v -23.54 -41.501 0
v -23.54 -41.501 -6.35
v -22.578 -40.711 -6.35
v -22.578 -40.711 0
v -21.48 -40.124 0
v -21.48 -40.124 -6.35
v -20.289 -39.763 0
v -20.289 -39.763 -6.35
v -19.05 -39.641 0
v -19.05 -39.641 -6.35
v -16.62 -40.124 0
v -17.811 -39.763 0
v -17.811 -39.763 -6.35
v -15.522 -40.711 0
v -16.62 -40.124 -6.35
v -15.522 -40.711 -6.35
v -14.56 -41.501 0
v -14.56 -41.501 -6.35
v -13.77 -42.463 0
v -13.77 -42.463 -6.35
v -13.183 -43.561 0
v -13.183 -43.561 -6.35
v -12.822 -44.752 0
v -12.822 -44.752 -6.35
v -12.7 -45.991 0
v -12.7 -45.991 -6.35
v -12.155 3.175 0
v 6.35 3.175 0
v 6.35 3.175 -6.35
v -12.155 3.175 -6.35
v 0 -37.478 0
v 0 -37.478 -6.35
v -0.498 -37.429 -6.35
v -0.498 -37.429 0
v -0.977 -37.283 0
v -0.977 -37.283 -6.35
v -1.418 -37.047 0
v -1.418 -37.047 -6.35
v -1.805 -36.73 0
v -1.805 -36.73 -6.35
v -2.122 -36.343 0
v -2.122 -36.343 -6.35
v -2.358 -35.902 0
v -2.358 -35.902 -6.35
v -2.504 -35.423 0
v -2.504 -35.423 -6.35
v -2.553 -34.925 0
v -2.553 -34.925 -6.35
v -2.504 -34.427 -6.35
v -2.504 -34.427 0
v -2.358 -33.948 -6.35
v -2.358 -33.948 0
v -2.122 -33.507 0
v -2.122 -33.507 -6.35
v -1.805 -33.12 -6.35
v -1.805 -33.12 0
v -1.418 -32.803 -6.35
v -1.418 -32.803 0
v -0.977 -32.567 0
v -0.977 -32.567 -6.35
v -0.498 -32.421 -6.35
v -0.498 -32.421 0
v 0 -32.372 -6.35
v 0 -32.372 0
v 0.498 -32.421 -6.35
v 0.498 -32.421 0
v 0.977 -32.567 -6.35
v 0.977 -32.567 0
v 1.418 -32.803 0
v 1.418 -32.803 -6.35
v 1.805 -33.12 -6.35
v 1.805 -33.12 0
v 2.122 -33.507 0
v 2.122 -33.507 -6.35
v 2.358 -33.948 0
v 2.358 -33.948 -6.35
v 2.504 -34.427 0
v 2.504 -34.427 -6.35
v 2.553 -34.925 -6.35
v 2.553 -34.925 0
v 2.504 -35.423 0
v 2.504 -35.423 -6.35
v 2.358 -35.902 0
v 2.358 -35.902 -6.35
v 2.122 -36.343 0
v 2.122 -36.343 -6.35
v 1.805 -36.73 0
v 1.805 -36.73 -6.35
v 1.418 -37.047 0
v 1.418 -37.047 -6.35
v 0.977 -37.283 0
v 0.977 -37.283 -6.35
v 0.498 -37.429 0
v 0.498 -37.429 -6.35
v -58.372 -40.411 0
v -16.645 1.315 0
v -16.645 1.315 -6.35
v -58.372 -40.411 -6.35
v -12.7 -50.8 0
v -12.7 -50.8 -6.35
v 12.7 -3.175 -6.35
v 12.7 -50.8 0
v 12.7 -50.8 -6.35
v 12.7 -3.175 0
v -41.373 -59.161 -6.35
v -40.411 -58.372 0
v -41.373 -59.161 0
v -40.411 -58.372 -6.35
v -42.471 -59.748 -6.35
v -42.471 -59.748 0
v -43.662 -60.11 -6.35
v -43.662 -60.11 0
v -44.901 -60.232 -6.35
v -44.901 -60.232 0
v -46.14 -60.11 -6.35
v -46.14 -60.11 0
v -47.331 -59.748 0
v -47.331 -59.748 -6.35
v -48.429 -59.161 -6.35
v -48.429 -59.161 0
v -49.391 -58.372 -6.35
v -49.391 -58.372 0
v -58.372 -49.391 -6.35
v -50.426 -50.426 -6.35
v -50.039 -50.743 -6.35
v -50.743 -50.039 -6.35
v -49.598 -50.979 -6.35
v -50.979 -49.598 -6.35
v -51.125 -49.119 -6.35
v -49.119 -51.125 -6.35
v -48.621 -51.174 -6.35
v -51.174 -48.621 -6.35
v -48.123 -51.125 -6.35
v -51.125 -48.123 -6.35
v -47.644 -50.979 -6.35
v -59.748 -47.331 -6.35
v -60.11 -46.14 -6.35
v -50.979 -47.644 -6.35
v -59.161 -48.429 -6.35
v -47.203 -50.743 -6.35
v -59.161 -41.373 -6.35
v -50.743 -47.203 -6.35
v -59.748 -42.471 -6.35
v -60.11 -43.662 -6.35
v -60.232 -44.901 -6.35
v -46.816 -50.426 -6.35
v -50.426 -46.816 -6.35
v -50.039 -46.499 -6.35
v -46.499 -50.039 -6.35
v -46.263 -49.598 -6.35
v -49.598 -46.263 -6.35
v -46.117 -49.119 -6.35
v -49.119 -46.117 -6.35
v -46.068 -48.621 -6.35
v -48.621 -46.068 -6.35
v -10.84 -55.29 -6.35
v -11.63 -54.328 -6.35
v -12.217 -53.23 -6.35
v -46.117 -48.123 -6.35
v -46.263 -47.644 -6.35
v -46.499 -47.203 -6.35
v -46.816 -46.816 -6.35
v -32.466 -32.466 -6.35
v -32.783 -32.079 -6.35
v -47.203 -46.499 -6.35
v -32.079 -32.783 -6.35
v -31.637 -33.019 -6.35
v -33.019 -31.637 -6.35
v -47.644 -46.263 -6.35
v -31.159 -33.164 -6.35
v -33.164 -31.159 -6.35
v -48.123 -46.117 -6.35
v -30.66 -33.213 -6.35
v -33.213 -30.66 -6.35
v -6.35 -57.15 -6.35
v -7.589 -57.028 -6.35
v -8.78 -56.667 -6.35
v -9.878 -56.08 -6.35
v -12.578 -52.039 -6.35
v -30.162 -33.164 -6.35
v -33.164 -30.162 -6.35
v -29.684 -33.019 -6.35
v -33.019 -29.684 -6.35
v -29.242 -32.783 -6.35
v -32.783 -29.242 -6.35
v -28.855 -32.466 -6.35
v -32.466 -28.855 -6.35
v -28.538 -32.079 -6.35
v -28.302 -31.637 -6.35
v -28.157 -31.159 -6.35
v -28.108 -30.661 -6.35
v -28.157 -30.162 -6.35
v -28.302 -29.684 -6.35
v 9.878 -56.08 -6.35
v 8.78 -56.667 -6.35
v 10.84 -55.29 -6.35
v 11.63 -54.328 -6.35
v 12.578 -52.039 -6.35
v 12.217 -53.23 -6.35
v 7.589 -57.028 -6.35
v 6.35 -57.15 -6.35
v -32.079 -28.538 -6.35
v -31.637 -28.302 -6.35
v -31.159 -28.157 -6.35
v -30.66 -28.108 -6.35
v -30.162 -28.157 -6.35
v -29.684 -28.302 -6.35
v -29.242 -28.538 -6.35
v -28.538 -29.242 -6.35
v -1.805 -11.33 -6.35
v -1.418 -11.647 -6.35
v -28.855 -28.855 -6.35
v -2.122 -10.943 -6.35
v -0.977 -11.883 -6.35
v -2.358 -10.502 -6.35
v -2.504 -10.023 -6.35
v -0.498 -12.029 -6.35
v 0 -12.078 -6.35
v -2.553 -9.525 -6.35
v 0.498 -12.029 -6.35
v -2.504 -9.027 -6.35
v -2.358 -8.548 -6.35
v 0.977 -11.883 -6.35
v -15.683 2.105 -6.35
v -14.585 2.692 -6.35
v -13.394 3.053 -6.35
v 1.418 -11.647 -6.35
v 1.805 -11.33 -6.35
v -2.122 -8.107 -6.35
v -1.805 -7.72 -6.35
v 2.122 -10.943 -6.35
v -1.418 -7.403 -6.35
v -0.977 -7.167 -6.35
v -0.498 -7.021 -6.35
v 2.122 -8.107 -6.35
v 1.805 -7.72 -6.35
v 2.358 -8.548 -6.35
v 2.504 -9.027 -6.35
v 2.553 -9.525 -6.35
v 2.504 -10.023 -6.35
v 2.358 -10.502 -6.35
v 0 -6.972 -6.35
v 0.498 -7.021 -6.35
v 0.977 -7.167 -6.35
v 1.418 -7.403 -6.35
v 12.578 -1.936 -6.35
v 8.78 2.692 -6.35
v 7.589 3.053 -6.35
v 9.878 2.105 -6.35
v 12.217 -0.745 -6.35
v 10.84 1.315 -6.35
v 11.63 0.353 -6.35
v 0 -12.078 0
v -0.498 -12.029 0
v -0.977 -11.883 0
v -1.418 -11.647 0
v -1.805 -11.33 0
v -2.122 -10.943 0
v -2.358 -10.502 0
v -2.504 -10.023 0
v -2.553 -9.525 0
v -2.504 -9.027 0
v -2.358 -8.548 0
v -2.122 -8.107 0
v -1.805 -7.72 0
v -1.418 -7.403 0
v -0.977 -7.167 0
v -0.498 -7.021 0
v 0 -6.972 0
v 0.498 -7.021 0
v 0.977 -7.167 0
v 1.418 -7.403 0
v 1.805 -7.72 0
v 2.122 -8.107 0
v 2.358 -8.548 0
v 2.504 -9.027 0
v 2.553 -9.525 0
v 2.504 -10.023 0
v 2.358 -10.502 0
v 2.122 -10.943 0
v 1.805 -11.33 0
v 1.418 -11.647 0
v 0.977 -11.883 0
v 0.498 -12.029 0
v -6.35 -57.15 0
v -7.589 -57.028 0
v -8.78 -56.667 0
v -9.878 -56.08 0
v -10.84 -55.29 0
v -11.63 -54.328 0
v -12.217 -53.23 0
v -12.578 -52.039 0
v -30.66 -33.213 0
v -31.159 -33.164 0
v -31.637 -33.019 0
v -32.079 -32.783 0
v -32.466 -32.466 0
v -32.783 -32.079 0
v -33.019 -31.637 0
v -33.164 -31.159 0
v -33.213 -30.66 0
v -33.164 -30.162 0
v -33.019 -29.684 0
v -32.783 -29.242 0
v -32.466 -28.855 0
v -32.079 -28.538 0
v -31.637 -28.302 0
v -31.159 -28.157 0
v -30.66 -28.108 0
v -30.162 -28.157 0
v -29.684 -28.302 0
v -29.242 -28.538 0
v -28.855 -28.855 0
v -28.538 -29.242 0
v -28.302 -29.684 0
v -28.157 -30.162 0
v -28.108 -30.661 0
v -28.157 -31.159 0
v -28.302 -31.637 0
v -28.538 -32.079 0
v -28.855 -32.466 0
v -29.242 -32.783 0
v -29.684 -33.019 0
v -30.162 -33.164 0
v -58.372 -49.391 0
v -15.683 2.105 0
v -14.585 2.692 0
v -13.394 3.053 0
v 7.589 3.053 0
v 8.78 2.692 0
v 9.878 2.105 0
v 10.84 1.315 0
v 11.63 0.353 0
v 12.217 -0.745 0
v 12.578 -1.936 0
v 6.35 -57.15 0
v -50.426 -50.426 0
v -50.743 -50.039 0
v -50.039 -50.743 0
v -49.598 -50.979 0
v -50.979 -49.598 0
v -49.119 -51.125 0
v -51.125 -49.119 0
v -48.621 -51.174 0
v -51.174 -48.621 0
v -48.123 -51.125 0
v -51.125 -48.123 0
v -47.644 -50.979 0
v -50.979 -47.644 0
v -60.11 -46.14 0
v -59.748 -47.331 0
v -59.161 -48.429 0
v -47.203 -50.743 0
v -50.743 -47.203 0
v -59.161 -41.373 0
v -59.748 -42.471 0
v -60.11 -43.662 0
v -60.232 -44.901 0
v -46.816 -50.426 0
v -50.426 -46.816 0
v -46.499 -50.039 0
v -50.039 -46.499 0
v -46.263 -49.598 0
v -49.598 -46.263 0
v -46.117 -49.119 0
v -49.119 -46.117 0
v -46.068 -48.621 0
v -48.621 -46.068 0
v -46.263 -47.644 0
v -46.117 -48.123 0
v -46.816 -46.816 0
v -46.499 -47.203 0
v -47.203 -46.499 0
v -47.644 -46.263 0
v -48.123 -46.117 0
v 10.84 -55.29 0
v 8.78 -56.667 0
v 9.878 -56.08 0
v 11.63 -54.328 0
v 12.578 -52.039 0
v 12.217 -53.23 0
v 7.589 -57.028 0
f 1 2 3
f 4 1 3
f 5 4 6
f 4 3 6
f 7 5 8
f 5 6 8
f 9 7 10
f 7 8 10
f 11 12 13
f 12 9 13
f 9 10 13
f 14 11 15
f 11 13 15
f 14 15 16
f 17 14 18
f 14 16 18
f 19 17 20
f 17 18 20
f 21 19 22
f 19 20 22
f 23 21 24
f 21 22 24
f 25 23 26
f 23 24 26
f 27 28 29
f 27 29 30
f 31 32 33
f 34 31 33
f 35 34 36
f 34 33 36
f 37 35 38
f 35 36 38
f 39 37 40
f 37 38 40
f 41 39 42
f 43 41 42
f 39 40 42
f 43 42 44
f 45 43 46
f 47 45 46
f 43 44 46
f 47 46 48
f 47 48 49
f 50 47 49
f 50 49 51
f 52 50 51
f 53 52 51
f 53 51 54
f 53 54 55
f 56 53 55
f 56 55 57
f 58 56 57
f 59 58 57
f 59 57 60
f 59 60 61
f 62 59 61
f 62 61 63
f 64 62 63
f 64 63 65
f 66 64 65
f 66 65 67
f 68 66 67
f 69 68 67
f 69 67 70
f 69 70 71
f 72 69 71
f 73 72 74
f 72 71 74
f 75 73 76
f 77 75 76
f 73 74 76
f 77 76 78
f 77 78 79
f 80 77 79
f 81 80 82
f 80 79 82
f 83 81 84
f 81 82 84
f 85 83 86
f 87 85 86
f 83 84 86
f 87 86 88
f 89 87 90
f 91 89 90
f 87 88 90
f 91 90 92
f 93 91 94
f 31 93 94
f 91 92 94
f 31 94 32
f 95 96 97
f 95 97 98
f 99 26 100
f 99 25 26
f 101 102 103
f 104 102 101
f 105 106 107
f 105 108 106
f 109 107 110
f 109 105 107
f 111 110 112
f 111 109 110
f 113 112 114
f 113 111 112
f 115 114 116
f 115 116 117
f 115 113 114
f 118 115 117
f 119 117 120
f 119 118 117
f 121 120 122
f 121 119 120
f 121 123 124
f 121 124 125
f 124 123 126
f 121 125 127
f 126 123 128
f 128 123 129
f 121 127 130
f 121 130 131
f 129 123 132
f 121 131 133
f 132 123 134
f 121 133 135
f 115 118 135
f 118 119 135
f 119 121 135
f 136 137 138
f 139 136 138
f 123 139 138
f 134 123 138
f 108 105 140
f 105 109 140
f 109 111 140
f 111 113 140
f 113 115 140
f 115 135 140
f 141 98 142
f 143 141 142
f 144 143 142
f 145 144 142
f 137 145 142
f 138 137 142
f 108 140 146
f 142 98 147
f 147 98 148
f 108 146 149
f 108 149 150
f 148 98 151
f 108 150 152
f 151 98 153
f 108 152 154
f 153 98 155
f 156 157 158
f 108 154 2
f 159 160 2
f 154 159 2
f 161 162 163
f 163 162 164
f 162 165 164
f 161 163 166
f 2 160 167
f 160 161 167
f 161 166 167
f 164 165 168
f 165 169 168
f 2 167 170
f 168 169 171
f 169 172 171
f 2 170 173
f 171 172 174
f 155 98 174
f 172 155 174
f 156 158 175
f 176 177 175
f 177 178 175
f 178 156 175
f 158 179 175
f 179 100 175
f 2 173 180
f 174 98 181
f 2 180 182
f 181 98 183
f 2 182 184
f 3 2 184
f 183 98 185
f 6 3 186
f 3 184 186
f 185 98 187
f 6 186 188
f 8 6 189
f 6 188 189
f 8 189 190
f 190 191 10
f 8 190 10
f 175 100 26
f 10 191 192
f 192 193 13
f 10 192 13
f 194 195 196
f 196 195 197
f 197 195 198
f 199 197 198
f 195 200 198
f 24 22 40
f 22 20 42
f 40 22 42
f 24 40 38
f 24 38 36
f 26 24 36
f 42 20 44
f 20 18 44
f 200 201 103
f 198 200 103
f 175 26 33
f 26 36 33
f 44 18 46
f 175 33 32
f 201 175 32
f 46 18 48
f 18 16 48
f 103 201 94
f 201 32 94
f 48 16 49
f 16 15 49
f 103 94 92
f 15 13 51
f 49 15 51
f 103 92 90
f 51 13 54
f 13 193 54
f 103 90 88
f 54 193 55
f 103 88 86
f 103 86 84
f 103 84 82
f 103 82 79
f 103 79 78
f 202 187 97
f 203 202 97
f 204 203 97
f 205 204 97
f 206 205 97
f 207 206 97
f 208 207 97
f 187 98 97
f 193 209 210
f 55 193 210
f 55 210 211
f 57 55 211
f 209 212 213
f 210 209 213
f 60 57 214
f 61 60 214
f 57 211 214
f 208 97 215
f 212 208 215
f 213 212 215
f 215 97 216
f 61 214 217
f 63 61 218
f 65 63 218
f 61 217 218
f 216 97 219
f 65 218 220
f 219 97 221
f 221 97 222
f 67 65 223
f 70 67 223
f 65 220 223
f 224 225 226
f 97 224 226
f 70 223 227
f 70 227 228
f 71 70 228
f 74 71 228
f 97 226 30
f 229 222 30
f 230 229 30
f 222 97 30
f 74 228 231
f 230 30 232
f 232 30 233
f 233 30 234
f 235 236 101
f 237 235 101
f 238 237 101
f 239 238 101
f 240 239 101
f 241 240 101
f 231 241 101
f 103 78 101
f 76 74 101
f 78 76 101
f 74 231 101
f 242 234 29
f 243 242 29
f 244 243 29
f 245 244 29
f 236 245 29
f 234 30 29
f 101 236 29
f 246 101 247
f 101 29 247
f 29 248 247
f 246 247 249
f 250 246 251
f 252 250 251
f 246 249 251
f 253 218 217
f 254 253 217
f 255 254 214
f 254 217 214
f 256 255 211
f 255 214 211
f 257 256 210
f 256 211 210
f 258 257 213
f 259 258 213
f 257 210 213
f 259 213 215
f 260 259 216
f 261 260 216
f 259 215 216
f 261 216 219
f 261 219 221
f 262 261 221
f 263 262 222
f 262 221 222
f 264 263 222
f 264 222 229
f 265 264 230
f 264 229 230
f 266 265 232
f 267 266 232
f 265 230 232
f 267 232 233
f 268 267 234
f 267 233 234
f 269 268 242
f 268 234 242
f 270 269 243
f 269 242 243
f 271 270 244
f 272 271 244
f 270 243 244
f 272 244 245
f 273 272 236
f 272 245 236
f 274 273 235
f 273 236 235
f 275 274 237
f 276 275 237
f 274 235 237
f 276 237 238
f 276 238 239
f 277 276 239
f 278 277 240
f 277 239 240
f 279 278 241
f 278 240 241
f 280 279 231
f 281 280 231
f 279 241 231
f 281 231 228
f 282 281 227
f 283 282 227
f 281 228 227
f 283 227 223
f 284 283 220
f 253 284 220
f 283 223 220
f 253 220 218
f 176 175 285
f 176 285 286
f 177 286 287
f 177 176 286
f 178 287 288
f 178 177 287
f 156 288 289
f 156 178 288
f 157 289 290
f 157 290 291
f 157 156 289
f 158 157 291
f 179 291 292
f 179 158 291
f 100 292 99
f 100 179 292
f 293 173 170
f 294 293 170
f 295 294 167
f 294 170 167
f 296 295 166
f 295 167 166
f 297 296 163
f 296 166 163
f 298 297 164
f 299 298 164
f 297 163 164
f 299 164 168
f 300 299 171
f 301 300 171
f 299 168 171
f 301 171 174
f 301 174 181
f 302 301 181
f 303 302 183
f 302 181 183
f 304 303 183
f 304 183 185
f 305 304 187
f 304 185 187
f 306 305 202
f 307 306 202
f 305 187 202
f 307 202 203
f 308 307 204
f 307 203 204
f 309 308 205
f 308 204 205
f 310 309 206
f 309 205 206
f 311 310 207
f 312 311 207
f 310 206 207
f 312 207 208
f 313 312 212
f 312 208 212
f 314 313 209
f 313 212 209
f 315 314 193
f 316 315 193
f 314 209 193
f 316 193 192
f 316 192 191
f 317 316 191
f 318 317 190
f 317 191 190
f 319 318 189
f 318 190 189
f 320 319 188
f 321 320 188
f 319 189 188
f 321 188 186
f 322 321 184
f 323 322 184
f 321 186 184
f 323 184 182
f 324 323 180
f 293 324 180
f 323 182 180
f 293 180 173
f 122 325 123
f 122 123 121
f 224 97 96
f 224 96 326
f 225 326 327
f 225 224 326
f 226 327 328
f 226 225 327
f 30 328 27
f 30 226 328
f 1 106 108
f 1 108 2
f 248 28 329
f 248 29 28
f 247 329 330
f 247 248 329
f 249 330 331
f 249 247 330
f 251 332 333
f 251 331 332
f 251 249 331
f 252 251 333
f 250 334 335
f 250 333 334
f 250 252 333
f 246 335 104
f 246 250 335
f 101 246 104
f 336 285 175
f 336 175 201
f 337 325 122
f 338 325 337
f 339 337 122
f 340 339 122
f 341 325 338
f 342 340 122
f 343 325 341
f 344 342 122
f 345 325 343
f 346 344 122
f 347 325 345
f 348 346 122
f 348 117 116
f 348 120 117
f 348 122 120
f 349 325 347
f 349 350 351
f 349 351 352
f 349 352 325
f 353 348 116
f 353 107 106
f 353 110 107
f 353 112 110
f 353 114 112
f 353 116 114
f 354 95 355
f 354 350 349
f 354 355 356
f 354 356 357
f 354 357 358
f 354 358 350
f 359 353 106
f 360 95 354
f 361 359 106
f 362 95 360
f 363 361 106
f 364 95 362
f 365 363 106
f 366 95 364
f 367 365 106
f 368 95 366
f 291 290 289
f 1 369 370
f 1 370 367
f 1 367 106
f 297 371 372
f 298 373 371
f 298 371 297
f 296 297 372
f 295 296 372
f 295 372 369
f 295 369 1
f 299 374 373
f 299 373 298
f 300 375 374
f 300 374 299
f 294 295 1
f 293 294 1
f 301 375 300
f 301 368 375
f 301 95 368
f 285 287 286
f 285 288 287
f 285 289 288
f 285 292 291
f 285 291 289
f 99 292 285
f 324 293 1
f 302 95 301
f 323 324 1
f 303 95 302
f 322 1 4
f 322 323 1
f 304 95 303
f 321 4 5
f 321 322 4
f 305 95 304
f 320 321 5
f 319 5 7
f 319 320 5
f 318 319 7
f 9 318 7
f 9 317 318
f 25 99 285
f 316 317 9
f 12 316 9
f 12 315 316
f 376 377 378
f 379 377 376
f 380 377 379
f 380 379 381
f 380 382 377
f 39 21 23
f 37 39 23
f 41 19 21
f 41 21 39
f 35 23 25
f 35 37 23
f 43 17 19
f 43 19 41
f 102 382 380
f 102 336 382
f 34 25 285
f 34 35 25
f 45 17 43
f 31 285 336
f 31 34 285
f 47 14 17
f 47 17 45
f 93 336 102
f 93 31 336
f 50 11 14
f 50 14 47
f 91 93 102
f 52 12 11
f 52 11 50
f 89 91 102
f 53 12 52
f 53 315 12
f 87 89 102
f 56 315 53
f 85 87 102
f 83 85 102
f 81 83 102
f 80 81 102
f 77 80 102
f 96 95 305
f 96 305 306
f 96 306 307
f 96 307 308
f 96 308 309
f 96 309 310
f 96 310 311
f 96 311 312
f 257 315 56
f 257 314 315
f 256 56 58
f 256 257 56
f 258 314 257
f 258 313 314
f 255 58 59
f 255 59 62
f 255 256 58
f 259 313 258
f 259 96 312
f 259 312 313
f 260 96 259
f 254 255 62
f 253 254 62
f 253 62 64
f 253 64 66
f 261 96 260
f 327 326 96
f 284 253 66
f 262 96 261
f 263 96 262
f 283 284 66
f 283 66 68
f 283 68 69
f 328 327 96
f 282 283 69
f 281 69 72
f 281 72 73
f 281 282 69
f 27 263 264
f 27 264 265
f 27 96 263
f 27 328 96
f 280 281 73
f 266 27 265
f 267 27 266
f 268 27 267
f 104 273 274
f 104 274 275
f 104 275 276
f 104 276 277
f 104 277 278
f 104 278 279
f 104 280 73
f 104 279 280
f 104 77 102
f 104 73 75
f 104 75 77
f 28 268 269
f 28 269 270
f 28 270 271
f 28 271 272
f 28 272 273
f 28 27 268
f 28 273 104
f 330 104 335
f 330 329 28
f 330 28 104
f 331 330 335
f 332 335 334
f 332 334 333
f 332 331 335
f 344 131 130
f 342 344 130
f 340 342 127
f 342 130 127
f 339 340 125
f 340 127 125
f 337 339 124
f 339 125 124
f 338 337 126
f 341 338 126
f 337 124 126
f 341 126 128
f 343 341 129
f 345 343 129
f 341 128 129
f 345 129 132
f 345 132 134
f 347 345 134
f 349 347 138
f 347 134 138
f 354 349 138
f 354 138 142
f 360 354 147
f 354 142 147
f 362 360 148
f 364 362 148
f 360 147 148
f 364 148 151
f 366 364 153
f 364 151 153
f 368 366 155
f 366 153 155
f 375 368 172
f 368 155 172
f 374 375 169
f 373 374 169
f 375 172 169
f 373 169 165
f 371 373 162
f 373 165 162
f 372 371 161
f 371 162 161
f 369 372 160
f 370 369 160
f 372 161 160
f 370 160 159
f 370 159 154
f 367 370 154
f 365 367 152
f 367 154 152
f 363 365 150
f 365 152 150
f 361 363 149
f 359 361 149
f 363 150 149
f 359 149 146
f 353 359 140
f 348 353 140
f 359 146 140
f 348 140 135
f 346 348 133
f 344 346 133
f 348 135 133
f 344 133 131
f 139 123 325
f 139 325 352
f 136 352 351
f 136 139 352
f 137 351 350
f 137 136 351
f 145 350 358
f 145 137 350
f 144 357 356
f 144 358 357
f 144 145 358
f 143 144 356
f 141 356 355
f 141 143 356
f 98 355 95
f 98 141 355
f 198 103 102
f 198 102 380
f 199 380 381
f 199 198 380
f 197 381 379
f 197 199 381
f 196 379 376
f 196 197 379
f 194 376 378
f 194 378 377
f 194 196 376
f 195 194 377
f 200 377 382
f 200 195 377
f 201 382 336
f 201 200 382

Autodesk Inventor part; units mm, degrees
ref_plane "YZ Plane" through (0, 0, 0) normal (1, 0, 0) x (0, 1, 0)
ref_plane "XZ Plane" through (0, 0, 0) normal (0, 1, 0) x (-1, 0, 0)
ref_plane "XY Plane" through (0, 0, 0) normal (0, 0, 1) x (1, 0, 0)
sketch "Sketch1" plane through (0, 0, 0) normal (0, 0, 1) x (1, 0, 0)
  line L0 (0, 0) -> (0, -57.15) construction
  line L1 (0, 0) -> (-53.8815, -53.8815) construction
  line L2 (12.7, 3.175) -> (-14.7855, 3.175)
  line L3 (-14.7855, 3.175) -> (-62.8618, -44.9013)
  line L4 (-62.8618, -44.9013) -> (-44.9013, -62.8618)
  line L5 (-44.9013, -62.8618) -> (-12.7, -30.6605)
  line L6 (-12.7, -30.6605) -> (-12.7, -57.15)
  line L7 (-12.7, -57.15) -> (12.7, -57.15)
  line L8 (12.7, -57.15) -> (12.7, 3.175)
  dimension "d0" = 45
  dimension "d1" = 57.15
  dimension "d2" = 76.2
  dimension "d3" = 3.175
  dimension "d4" = 25.4
  dimension "d5" = 25.4
extrude "Extrusion1" add sketch "Sketch1" against normal blind 6.35
sketch "Sketch2" plane through (0, 0, 0) normal (0, 0, 1) x (1, 0, 0)
  line L0 (-44.9013, -62.8618) -> (-62.8618, -44.9013) construction
  line L1 (-62.8618, -44.9013) -> (-14.7855, 3.175) construction
  line L2 (-14.7855, 3.175) -> (12.7, 3.175) construction
  line L3 (12.7, 3.175) -> (12.7, -57.15) construction
  line L4 (12.7, -57.15) -> (-12.7, -57.15) construction
  line L5 (-12.7, -57.15) -> (-12.7, -30.6605) construction
  line L6 (-12.7, -30.6605) -> (-44.9013, -62.8618) construction
  line L7 (-44.9013, -62.8618) -> (-62.8618, -44.9013) construction
  line L8 (-62.8618, -44.9013) -> (-14.7855, 3.175) construction
  line L9 (-14.7855, 3.175) -> (12.7, 3.175) construction
  line L10 (12.7, 3.175) -> (12.7, -57.15) construction
  line L11 (12.7, -57.15) -> (-12.7, -57.15) construction
  line L12 (-12.7, -57.15) -> (-12.7, -30.6605) construction
  line L13 (-12.7, -30.6605) -> (-44.9013, -62.8618) construction
  line L14 (0, 0) -> (0, -57.15) construction
  line L15 (12.7, -57.15) -> (-12.7, -57.15) construction
  line L16 (0, 0) -> (-53.8815, -53.8815) construction
  line L17 (-44.9013, -62.8618) -> (-62.8618, -44.9013) construction
  line L18 (-12.7, -30.6605) -> (-12.7, 3.175) construction
  line L19 (-14.7855, 3.175) -> (12.7, 3.175) construction
  point P0 (-30.6605, -30.6605)
  point P1 (-48.621, -48.621)
  point P2 (0, -9.525)
  point P3 (0, -34.925)
  point P4 (-12.7, -12.7)
  point P5 (-12.7, -13.7428)
  dimension "d8" = 25.4
  dimension "d9" = 25.4
  dimension "d19" = 12.7
  dimension "d21" = 25.4
hole "Hole1" at (-30.6605, -30.6605, 0) at (-48.621, -48.621, 0) at (0, -9.525, 0) at (0, -34.925, 0) direction (0, 0, -1) diameter 5.1054 end through all clearance for "Flat Head Machine Screw (82)" size "#10" standard "Ansi Unified Screw Threads"
fillet "Fillet1" radius 6.35 7 edges at (12.7, 3.175, -3.175) (-14.7855, 3.175, -3.175) (-62.8618, -44.9013, -3.175) (-44.9013, -62.8618, -3.175) (-12.7, -30.6605, -3.175) (-12.7, -57.15, -3.175) (12.7, -57.15, -3.175)
equation "\"d5\" = d4"
properties part number "CL4-008" material "Aluminum 6061"
